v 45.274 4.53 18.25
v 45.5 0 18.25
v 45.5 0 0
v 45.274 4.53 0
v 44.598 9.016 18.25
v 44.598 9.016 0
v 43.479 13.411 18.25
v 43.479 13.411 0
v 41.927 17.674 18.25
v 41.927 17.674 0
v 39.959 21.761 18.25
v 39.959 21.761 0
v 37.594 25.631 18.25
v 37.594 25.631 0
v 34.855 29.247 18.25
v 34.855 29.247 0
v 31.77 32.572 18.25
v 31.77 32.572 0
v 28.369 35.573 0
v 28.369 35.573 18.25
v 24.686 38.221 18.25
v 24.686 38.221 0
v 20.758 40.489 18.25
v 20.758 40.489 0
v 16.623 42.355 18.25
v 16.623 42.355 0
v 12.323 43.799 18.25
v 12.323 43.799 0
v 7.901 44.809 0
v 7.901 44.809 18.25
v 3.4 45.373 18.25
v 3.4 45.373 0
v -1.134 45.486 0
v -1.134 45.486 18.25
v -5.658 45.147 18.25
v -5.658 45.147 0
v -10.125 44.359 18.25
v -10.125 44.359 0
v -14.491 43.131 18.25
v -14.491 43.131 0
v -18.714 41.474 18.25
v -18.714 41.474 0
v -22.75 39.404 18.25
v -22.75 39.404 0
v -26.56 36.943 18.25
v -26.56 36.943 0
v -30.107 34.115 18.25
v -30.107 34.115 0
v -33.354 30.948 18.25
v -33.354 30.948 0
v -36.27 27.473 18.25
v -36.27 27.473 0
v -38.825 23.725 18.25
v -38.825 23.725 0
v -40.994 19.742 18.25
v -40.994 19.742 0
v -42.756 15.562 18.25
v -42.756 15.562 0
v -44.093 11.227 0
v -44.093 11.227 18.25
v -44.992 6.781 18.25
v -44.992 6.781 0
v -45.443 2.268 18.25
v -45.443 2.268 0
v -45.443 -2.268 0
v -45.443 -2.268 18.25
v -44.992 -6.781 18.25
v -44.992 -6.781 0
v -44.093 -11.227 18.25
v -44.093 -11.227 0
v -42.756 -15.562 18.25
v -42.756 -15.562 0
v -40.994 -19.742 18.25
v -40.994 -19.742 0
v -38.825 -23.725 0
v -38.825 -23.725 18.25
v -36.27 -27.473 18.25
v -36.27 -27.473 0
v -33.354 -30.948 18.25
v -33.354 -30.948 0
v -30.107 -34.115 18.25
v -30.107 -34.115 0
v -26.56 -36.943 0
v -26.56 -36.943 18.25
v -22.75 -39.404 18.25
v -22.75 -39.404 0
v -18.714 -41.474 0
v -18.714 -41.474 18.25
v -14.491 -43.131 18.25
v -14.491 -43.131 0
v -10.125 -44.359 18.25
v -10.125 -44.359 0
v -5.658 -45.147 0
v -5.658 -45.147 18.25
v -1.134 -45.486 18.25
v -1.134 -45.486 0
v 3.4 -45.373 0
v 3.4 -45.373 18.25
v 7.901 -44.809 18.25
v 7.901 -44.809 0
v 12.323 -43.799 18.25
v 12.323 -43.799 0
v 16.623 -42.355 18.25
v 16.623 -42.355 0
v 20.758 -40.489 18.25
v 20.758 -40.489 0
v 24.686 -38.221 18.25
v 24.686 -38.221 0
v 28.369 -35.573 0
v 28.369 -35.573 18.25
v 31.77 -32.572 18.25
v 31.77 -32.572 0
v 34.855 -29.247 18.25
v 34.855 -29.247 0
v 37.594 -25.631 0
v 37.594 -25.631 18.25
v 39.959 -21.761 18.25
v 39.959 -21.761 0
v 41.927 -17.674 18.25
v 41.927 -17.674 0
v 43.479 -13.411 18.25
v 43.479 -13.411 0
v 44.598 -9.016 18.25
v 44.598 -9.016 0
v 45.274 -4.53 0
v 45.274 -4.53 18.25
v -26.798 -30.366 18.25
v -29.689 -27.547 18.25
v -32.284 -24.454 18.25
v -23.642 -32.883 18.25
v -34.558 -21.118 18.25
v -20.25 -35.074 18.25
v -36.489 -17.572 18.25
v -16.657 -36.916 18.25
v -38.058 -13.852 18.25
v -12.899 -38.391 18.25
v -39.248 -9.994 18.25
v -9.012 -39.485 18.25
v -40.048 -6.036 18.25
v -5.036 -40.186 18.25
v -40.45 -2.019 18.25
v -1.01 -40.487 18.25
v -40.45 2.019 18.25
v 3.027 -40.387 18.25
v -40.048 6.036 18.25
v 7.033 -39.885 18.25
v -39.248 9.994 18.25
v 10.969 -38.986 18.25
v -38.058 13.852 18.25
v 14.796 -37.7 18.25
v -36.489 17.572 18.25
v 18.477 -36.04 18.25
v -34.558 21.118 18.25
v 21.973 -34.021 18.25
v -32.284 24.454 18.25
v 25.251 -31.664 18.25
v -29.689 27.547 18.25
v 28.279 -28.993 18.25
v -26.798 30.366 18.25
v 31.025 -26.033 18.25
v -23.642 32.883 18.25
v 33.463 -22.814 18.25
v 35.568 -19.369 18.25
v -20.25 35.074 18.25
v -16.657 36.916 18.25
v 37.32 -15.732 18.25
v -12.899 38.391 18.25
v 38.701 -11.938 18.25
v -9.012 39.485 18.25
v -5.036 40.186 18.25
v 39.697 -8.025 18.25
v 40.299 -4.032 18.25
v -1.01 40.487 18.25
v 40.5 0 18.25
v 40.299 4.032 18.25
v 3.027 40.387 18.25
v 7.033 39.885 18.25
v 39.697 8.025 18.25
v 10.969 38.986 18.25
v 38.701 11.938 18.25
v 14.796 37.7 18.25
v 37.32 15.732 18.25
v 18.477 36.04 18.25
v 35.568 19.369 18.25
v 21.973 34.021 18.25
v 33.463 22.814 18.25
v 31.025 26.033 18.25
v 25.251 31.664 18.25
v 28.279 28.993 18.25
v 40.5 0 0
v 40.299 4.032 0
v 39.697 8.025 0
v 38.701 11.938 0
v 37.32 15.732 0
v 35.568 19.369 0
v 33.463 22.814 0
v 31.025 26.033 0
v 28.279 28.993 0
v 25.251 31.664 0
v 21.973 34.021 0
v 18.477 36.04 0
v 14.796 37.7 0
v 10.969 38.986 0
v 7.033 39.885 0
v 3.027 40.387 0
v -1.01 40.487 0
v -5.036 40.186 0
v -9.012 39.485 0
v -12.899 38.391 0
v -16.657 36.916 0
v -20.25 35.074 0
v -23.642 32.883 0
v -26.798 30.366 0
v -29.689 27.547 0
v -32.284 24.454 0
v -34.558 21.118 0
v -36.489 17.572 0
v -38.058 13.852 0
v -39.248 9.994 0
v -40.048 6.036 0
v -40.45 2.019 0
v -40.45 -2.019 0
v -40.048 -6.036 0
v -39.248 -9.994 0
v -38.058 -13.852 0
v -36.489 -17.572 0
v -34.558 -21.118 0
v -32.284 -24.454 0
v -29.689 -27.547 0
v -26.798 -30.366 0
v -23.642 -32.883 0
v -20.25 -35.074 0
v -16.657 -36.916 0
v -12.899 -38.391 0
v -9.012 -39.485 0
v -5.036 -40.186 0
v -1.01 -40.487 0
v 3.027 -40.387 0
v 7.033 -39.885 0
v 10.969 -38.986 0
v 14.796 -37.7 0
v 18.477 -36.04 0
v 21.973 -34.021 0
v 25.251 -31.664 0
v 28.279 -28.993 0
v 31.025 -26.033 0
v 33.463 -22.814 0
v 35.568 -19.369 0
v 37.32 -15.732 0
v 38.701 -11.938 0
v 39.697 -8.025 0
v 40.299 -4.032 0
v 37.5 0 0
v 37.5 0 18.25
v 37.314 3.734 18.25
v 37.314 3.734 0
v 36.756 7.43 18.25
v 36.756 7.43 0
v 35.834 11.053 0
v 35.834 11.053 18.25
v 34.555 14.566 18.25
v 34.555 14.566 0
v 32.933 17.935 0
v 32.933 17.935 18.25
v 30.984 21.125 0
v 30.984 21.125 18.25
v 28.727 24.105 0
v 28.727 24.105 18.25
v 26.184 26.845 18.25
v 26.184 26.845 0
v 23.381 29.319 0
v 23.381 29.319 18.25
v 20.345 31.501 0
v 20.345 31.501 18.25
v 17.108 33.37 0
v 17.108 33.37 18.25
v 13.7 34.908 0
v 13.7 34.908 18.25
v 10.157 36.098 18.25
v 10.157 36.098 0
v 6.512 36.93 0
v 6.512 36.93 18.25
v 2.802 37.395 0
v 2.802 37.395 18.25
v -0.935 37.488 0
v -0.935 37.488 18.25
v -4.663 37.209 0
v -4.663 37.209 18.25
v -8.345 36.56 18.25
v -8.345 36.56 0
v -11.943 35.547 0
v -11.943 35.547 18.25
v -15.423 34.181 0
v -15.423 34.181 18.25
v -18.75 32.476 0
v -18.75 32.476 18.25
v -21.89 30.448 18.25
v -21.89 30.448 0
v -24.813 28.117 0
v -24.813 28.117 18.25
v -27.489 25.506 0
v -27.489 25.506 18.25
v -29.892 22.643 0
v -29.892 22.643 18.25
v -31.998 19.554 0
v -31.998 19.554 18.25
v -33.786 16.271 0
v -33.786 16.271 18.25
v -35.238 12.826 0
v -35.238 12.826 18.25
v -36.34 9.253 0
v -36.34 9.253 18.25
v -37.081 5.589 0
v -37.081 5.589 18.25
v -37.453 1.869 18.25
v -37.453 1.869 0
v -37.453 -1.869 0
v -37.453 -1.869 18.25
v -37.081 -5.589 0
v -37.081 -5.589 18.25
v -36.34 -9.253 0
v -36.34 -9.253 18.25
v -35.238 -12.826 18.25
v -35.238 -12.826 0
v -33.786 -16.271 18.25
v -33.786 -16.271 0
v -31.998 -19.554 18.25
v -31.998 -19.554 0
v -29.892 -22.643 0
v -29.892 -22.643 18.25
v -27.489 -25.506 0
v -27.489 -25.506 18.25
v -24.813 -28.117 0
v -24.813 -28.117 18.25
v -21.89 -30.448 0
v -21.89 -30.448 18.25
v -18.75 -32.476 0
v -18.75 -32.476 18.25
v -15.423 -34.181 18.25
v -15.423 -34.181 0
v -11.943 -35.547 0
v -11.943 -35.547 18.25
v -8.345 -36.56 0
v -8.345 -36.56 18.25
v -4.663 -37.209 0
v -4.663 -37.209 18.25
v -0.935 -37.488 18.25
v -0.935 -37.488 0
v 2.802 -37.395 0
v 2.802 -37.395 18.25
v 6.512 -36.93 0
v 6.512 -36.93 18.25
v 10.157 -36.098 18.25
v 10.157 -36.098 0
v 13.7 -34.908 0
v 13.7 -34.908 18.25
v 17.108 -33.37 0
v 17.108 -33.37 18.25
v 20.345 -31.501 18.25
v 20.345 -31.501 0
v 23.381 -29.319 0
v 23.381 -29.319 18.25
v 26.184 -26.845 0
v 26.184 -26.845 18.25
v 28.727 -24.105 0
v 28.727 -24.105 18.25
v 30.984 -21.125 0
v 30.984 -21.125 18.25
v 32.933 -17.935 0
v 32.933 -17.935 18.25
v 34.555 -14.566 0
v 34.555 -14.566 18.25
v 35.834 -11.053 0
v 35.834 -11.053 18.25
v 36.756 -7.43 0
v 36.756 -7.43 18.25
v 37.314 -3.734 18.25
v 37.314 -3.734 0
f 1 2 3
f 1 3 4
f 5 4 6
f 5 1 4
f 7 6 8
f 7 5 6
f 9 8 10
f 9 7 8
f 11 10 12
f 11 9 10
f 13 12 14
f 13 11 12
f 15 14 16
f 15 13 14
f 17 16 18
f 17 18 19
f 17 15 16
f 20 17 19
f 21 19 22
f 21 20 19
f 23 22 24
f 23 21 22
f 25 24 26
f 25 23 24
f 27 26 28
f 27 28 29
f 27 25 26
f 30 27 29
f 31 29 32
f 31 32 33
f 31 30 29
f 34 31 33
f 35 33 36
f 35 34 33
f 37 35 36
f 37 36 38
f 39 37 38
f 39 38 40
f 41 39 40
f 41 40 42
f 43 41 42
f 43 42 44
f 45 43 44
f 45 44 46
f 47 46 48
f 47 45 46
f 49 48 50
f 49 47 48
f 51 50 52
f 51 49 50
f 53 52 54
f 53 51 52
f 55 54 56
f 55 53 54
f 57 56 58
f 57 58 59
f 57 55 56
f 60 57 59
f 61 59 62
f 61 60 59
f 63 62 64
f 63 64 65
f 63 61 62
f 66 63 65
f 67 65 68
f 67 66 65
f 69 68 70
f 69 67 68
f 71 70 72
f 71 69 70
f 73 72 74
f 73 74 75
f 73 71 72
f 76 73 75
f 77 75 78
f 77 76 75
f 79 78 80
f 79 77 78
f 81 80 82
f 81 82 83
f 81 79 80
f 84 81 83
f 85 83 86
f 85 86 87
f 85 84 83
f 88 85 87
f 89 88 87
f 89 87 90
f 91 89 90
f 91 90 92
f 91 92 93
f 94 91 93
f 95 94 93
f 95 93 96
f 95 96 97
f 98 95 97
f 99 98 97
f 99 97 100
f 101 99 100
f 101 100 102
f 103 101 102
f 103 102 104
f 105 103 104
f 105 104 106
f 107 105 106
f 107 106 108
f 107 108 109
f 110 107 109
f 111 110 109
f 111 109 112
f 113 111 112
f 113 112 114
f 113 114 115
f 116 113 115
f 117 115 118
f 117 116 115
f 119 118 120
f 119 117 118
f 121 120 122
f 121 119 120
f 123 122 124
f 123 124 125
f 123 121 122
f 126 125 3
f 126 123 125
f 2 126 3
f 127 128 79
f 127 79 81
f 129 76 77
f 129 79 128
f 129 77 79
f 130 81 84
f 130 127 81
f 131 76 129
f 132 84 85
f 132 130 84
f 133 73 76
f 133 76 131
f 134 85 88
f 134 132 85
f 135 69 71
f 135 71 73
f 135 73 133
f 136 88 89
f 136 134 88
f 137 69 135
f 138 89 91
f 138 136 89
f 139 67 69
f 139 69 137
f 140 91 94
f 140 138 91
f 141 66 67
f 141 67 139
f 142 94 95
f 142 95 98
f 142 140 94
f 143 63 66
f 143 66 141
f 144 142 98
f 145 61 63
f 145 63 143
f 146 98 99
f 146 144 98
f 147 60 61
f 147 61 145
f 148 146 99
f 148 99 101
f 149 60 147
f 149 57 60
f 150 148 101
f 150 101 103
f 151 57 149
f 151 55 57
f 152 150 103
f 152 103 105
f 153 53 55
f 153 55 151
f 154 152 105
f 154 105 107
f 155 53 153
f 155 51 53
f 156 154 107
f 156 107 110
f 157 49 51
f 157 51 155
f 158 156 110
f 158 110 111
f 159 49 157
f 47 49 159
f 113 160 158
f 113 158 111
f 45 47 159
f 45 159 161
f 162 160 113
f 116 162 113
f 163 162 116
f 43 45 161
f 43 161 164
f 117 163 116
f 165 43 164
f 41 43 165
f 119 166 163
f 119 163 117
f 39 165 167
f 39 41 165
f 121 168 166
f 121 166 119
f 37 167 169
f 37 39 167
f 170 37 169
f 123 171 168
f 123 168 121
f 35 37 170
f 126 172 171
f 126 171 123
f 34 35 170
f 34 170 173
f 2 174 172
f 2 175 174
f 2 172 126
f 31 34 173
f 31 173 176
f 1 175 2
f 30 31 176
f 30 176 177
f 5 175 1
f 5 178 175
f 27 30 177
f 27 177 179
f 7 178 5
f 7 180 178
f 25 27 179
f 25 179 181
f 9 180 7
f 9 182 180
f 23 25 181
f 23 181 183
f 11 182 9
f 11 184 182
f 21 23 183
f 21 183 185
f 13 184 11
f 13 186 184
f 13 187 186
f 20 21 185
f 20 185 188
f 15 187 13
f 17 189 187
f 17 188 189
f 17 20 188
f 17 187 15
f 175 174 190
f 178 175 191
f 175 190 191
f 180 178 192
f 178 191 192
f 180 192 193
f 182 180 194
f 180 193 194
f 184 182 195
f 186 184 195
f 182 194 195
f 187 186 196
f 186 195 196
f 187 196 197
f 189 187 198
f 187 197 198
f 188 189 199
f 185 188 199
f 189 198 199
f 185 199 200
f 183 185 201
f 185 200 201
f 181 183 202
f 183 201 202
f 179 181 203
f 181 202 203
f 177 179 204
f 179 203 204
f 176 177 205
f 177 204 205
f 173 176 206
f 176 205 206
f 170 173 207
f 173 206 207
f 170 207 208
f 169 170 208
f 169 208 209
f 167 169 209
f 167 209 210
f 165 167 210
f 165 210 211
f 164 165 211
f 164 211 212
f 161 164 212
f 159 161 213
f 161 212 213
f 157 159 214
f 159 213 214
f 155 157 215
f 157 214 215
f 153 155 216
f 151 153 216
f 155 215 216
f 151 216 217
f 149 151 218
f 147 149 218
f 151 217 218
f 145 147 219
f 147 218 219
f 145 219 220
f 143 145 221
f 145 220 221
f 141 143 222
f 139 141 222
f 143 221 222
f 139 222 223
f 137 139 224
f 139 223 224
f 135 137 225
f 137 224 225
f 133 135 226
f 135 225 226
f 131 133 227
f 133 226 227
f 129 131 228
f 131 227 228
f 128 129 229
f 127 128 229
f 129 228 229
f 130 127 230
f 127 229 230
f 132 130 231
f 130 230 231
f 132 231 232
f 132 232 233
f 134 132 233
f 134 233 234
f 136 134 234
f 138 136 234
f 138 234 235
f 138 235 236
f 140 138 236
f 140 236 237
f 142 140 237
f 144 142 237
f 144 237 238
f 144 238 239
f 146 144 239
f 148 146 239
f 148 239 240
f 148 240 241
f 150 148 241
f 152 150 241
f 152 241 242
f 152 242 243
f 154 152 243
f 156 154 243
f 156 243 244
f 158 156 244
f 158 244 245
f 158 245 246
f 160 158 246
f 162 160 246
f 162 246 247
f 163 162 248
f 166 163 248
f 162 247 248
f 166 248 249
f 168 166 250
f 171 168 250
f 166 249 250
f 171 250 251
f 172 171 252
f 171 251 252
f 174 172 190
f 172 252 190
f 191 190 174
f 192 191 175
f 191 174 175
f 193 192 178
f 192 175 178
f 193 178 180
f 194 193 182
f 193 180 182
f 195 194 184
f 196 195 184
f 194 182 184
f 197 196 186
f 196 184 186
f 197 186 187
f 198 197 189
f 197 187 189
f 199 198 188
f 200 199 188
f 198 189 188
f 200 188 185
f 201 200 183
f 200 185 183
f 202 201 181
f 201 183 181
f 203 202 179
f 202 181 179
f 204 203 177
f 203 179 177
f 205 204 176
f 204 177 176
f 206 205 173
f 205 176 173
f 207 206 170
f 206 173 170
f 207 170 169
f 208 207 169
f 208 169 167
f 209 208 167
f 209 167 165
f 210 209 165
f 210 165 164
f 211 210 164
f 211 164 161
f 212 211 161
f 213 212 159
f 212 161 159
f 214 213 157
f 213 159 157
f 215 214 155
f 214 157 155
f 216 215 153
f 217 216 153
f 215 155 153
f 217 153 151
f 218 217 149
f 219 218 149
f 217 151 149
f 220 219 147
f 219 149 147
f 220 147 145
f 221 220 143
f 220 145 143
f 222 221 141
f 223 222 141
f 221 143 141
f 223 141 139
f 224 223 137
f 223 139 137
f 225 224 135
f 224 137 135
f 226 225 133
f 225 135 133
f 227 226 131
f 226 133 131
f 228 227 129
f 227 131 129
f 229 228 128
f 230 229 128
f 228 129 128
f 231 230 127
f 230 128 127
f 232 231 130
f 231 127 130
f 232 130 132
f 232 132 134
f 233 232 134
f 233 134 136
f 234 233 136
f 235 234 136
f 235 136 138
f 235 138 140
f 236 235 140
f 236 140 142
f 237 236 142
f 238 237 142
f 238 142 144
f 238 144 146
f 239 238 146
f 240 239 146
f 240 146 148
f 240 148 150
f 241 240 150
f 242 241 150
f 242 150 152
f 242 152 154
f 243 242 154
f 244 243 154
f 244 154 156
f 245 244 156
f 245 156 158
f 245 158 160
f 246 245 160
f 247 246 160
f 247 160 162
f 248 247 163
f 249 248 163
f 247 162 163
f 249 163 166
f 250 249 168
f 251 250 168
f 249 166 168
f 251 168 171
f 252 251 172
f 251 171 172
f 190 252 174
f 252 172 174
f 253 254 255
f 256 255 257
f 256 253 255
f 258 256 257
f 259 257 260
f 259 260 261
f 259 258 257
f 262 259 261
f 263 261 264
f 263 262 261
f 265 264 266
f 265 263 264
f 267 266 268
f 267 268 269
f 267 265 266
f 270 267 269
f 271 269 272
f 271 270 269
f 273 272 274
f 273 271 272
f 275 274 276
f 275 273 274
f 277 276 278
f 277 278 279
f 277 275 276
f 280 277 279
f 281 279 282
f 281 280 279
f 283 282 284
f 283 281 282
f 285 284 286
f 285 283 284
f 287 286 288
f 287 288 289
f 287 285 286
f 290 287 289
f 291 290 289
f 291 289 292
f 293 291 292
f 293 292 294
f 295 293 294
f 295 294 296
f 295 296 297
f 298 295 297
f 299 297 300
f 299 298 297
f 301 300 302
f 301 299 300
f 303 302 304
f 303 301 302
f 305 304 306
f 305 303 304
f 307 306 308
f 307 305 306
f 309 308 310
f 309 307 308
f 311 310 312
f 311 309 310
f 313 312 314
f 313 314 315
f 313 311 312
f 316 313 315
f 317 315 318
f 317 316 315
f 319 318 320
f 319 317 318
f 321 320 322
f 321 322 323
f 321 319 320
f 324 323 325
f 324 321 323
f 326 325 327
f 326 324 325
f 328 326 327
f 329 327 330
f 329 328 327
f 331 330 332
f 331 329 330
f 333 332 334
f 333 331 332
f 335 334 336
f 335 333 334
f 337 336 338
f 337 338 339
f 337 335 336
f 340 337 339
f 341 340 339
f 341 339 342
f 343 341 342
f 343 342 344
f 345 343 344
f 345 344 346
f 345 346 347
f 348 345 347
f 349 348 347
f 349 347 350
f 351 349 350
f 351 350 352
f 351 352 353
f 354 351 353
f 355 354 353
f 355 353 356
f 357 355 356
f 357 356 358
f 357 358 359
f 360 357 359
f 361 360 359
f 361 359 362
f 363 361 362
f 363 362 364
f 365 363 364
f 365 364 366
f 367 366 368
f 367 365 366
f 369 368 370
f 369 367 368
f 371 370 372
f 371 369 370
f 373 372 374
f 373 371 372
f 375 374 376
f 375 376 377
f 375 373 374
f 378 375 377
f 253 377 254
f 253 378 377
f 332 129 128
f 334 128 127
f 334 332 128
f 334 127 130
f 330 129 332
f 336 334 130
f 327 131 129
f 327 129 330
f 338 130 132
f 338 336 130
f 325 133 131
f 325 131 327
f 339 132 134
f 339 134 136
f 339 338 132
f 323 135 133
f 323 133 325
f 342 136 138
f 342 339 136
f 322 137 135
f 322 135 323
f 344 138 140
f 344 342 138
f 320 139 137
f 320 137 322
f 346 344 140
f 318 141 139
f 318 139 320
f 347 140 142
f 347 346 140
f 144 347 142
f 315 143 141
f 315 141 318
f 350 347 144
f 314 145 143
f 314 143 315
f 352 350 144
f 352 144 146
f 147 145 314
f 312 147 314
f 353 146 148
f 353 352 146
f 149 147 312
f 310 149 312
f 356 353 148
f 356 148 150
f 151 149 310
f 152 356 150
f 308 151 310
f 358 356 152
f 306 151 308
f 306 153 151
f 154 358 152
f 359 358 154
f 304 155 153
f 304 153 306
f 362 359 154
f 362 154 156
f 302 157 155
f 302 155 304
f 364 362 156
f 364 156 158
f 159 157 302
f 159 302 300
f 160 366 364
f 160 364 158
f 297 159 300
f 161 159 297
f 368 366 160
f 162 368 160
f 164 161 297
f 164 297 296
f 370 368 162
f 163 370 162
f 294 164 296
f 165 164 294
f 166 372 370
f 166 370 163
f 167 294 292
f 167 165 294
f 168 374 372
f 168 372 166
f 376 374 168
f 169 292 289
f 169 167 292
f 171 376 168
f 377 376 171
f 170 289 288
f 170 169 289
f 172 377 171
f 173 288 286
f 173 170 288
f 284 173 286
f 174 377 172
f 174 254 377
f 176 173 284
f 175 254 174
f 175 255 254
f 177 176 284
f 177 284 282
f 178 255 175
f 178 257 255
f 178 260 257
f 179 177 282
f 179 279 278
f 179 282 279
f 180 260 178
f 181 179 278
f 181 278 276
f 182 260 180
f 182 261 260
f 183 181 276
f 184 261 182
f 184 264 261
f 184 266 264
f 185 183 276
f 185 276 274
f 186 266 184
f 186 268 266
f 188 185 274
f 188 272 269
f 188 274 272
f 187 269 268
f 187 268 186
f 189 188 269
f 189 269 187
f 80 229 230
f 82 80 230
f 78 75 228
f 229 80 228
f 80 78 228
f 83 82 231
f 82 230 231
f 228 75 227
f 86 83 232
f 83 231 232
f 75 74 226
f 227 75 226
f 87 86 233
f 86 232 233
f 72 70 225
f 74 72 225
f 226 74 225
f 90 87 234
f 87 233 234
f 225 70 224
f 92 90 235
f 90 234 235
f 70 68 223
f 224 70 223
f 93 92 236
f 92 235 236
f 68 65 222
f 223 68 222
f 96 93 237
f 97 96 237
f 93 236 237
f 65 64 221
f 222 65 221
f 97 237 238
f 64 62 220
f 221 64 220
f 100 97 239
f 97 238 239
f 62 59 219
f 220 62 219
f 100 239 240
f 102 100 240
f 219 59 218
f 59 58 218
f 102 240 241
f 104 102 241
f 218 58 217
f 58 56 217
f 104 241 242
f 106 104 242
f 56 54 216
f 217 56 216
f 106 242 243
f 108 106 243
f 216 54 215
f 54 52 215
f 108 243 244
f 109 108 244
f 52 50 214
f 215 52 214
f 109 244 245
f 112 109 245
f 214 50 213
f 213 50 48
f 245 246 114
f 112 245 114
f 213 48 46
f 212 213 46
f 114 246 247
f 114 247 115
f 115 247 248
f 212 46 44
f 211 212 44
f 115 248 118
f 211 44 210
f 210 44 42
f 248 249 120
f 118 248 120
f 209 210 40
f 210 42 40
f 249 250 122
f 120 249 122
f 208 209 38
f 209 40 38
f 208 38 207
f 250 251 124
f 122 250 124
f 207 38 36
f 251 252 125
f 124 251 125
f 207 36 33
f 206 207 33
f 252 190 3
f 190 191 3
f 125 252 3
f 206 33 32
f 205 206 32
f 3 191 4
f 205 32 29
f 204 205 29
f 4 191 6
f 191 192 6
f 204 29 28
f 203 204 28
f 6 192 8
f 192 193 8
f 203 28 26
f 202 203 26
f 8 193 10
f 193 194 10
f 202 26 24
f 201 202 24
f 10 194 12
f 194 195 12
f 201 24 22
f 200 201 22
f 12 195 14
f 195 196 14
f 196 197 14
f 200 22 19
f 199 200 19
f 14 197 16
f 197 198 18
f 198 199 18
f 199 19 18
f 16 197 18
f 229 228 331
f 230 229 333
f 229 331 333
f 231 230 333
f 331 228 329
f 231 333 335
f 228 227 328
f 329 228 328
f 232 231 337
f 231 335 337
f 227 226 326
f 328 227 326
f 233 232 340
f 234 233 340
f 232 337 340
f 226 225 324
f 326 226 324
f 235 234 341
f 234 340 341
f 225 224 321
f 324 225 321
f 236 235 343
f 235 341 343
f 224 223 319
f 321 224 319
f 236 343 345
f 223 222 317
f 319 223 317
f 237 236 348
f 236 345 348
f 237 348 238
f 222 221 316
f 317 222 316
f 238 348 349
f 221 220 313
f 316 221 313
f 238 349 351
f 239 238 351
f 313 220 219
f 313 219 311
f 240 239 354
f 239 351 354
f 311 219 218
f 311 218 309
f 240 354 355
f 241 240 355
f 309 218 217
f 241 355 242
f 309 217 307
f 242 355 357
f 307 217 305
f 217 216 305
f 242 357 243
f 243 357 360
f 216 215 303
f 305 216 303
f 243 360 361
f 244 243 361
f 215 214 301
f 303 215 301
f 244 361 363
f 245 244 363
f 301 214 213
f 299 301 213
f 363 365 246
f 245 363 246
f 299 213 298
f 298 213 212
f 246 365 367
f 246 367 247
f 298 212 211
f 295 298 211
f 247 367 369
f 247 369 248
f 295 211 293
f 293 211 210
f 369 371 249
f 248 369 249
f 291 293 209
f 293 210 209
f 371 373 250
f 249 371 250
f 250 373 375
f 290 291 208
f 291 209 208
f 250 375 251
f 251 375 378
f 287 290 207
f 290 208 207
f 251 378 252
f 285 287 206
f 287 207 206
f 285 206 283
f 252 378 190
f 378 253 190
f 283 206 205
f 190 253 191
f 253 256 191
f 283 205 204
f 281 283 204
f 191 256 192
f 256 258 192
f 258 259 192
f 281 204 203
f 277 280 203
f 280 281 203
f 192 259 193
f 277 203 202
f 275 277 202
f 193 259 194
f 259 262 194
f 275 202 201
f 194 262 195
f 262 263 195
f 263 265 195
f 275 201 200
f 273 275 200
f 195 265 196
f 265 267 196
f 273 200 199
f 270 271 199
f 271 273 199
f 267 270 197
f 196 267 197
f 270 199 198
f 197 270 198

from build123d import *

# Parameters (mm, degrees)
F0_R     = 40.5
F0_R_2   = 37.5
F1_DEPTH = 18.25
F2_R     = 45.5
F2_R_2   = 40.5
F3_DEPTH = 18.25


with BuildPart() as f1:
    # F0 (on Top) → F1 (new body)
    with BuildSketch(Plane.XY):
        Circle(F0_R)
        Circle(F0_R_2, mode=Mode.SUBTRACT)
    extrude(amount=F1_DEPTH)


with BuildPart() as f3:
    # F2 (on face) → F3 (new body, through all)
    with BuildSketch(Plane.XY.offset(18.25)):
        Circle(F2_R)
        Circle(F2_R_2, mode=Mode.SUBTRACT)
    extrude(amount=-F3_DEPTH)


solid = Compound([f1.part, f3.part])
